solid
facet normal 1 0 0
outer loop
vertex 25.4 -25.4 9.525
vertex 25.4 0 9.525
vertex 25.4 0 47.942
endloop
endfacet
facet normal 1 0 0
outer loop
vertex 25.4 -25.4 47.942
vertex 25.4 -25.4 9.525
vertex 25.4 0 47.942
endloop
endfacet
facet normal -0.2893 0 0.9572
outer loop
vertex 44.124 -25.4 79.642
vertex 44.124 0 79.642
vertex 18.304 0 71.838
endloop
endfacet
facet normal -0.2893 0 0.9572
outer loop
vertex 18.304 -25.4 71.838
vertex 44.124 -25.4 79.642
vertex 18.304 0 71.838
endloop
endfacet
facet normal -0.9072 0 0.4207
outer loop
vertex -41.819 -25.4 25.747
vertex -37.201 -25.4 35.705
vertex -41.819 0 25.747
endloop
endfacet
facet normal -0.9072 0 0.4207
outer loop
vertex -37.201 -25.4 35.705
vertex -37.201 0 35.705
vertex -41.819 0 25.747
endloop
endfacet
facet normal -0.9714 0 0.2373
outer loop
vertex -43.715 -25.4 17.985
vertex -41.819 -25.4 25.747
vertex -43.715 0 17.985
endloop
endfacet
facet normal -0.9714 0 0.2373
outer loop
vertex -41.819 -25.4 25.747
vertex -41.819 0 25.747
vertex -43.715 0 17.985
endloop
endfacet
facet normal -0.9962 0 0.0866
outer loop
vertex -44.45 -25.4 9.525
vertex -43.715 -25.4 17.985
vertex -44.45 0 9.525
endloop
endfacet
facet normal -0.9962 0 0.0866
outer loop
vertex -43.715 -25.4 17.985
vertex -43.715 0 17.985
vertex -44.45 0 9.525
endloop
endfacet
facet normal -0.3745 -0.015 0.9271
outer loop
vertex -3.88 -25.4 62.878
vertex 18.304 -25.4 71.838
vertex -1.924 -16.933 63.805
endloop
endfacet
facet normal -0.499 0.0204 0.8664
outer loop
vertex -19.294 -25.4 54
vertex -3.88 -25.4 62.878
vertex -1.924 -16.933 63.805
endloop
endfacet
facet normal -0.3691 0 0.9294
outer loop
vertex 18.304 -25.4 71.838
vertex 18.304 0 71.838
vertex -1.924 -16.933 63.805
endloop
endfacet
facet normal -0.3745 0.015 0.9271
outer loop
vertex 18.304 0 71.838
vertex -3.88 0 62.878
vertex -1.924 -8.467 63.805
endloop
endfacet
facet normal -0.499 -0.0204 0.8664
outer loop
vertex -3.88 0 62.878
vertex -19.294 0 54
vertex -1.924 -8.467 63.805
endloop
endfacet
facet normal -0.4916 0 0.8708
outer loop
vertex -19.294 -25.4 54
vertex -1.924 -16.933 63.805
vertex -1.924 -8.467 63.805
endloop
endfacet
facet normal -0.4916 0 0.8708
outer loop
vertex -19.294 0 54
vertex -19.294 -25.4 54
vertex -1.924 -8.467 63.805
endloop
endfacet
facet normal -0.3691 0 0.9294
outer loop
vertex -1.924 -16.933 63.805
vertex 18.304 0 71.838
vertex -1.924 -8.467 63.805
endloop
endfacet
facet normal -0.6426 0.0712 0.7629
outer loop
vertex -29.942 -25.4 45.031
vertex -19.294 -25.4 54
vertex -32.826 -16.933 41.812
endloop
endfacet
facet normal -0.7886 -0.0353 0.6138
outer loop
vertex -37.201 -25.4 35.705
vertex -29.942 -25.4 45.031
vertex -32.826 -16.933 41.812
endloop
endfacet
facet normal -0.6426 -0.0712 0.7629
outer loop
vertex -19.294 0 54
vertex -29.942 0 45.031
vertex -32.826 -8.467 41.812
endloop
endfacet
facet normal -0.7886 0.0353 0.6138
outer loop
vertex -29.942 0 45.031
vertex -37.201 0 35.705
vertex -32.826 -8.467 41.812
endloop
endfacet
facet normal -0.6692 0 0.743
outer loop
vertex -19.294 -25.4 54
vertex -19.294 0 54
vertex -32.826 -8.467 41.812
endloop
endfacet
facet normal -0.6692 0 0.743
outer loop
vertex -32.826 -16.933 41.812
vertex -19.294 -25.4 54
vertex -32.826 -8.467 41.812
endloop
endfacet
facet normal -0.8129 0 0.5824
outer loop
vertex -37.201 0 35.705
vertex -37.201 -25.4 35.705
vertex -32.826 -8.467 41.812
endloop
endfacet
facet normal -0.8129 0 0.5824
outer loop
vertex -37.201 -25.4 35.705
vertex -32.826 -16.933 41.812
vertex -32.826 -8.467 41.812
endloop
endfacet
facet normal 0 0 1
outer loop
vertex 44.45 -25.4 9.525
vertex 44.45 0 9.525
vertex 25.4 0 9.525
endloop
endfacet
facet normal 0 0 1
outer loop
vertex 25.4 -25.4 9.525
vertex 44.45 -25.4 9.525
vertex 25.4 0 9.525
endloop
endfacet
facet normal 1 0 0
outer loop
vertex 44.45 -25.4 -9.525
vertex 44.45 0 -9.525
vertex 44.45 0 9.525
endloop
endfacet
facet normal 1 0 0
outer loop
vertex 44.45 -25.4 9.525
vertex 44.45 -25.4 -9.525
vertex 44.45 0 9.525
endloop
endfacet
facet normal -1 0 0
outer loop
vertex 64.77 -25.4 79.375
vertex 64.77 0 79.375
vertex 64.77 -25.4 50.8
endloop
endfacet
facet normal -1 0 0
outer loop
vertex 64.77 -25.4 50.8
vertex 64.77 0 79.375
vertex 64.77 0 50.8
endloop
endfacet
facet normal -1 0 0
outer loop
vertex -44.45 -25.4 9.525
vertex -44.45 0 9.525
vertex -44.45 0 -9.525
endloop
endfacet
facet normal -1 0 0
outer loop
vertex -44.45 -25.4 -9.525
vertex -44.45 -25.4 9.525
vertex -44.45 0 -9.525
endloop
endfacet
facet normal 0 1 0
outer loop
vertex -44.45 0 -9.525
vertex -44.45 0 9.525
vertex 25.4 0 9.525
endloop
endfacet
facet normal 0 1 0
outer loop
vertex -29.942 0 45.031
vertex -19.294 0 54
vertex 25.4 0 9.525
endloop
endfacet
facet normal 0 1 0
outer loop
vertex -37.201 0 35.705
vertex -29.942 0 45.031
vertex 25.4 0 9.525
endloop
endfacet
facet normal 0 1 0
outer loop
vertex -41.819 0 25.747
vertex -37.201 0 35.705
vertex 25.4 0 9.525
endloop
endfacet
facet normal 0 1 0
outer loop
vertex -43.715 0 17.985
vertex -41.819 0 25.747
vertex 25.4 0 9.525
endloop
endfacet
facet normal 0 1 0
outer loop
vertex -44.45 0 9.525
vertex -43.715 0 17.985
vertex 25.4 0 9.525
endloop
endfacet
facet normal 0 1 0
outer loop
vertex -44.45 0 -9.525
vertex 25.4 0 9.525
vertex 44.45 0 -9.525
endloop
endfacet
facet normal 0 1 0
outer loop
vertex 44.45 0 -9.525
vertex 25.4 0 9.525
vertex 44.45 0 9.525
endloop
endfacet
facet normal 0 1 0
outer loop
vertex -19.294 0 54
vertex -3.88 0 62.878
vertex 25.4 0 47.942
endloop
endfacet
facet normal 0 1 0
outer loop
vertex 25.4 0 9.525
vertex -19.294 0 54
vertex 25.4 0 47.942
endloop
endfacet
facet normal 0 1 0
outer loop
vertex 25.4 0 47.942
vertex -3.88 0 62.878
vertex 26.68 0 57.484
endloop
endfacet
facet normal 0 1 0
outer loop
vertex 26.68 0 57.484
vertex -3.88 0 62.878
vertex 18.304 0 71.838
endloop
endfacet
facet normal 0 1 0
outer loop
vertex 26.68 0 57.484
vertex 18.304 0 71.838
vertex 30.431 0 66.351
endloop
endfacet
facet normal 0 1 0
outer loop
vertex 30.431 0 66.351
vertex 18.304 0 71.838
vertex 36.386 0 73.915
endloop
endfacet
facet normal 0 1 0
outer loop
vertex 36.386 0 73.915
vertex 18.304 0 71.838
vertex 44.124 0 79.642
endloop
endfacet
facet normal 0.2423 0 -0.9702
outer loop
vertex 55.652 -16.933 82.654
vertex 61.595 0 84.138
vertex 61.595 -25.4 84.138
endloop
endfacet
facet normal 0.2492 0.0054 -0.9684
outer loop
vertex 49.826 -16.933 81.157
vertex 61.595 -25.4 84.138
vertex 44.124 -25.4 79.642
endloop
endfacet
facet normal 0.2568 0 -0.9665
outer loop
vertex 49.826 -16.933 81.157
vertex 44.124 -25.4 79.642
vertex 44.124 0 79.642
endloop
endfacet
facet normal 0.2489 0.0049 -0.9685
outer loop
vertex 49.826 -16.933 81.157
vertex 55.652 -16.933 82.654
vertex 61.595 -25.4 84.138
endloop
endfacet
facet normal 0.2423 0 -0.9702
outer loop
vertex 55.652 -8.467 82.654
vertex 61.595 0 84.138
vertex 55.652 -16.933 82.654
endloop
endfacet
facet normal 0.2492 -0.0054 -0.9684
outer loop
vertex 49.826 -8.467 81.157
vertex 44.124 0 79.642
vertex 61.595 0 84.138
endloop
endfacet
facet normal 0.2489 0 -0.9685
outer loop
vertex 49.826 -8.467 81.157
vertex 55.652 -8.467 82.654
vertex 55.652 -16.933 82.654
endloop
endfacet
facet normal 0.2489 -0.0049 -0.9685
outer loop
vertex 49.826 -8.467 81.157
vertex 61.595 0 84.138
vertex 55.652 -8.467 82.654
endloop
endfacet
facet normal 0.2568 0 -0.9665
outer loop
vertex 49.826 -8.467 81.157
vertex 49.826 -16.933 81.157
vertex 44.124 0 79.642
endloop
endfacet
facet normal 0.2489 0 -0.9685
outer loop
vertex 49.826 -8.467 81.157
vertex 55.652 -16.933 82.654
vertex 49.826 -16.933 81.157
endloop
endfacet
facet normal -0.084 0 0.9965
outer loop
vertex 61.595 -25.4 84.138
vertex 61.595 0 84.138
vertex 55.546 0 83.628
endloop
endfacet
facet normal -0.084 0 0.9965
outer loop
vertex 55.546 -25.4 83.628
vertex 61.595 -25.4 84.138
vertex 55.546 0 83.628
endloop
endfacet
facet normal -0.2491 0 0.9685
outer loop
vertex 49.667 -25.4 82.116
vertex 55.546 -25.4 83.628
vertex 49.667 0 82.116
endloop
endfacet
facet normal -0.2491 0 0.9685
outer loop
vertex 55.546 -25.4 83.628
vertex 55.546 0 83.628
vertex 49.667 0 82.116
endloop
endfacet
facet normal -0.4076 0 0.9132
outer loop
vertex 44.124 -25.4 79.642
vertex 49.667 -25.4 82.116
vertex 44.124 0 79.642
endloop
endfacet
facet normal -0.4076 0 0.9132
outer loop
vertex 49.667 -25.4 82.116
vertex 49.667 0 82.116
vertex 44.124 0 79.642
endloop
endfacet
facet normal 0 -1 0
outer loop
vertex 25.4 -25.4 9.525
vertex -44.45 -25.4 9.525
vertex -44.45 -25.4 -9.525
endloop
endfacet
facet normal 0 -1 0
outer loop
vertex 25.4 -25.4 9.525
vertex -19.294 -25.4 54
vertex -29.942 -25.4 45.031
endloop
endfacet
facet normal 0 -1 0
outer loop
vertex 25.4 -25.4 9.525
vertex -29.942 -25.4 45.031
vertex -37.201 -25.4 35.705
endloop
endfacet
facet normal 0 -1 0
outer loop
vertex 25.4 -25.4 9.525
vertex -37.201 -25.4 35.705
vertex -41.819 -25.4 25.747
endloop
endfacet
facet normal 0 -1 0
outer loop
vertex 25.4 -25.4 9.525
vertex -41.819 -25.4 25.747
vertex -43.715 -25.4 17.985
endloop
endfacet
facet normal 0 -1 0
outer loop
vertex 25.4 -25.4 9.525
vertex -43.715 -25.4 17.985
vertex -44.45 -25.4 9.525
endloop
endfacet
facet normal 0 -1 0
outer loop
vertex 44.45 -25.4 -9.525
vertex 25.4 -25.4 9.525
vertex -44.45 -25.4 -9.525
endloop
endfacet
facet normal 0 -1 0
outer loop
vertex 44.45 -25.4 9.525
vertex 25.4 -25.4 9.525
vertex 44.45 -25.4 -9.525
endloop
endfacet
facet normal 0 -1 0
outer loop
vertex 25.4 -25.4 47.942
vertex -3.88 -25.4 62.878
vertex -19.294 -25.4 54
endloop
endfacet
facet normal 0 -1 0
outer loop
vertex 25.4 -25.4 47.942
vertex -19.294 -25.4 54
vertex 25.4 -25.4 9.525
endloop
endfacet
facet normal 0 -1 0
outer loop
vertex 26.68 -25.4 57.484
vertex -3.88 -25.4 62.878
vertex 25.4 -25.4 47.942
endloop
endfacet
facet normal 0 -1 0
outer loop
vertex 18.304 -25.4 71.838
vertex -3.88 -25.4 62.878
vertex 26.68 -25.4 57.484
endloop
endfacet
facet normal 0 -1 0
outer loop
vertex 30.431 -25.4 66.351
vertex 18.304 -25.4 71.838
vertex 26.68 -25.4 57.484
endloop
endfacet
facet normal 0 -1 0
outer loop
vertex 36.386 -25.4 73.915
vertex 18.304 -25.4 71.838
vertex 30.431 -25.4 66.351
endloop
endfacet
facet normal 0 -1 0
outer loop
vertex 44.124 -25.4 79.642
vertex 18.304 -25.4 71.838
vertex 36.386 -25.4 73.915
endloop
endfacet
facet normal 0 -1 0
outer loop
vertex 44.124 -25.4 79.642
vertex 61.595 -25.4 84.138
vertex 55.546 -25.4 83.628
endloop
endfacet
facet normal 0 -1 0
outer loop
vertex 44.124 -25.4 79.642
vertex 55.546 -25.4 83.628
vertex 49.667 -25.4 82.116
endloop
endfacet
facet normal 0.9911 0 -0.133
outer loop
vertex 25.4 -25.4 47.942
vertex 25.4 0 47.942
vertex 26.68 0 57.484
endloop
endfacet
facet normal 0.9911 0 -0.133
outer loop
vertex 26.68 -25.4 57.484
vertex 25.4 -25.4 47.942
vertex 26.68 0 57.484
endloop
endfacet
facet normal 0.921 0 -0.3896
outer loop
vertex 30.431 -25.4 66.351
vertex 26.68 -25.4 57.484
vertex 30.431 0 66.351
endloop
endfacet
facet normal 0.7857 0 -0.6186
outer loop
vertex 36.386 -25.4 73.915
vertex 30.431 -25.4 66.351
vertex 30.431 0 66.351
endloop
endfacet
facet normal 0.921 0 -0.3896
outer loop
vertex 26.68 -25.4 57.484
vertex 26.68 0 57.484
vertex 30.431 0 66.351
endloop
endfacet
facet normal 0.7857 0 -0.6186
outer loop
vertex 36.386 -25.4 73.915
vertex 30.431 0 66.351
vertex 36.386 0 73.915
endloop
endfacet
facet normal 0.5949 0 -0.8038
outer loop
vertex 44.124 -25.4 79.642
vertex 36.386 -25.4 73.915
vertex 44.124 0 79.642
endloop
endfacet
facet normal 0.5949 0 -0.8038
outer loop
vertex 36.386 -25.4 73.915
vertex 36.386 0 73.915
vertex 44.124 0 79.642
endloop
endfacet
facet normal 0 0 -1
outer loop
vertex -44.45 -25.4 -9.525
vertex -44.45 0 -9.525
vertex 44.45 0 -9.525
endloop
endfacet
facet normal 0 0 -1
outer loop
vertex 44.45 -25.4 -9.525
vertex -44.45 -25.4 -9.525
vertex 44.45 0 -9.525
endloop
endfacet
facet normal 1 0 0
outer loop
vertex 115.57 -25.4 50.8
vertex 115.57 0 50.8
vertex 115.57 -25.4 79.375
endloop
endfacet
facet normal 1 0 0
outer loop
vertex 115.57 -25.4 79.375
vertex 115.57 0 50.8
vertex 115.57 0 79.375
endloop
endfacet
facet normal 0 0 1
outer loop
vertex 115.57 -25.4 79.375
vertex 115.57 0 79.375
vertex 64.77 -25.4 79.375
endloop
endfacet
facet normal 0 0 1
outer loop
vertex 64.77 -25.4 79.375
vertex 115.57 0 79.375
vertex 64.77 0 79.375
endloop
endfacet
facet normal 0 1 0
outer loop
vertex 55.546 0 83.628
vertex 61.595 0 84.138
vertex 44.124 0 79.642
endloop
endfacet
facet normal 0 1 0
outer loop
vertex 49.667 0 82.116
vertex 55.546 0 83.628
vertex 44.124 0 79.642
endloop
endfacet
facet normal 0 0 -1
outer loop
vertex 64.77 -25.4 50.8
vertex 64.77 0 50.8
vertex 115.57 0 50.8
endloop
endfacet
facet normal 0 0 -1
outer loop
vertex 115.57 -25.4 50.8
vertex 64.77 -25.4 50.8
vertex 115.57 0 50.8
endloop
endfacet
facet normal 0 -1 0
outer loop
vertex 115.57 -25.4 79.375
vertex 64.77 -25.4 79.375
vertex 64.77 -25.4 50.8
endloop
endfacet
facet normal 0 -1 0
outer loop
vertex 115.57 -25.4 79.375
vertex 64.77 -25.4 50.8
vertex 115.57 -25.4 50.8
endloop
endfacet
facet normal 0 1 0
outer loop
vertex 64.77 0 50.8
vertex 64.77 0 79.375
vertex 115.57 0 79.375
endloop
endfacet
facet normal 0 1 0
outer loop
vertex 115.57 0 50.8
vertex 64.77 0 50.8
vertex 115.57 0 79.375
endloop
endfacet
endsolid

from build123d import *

# Parameters (mm, degrees)
F1_DEPTH = 25.4


with BuildPart() as f1:
    # F0 (on Front) → F1 (new body)
    with BuildSketch(Plane.XZ):
        Polygon((-44.45, 9.525), (-44.45, -9.525), (44.45, -9.525), (44.45, 9.525), (25.4, 9.525), align=None)
        with BuildLine():
            ThreePointArc((61.595, 84.1375), (52.575049, 82.995581), (44.124239, 79.641878))
            add(Edge.make_bspline(
                [(61.595, 84.1375), (55.594525, 82.658599), (49.763145, 81.167864), (44.124239, 79.641878)],
                knots=[0, 0, 0, 0, 12.631566, 12.631566, 12.631566, 12.631566], degree=3))
        make_face()
        Polygon((64.77, 79.375), (64.77, 65.0875), (64.77, 50.8), (115.57, 50.8), (115.57, 79.375), align=None)
        with BuildLine():
            add(Edge.make_bspline(
                [(44.124239, 79.641878), (-8.120342, 65.503581), (-43.842862, 48.339274), (-44.45, 9.525)],
                knots=[12.631566, 12.631566, 12.631566, 12.631566, 129.663284, 129.663284, 129.663284, 129.663284], degree=3))
            Line((-44.45, 9.525), (25.4, 9.525))
            Line((25.4, 9.525), (25.4, 47.9425))
            ThreePointArc((25.4, 47.9425), (30.43066, 66.350703), (44.124239, 79.641878))
        make_face()
    extrude(amount=F1_DEPTH)


solid = f1.part
